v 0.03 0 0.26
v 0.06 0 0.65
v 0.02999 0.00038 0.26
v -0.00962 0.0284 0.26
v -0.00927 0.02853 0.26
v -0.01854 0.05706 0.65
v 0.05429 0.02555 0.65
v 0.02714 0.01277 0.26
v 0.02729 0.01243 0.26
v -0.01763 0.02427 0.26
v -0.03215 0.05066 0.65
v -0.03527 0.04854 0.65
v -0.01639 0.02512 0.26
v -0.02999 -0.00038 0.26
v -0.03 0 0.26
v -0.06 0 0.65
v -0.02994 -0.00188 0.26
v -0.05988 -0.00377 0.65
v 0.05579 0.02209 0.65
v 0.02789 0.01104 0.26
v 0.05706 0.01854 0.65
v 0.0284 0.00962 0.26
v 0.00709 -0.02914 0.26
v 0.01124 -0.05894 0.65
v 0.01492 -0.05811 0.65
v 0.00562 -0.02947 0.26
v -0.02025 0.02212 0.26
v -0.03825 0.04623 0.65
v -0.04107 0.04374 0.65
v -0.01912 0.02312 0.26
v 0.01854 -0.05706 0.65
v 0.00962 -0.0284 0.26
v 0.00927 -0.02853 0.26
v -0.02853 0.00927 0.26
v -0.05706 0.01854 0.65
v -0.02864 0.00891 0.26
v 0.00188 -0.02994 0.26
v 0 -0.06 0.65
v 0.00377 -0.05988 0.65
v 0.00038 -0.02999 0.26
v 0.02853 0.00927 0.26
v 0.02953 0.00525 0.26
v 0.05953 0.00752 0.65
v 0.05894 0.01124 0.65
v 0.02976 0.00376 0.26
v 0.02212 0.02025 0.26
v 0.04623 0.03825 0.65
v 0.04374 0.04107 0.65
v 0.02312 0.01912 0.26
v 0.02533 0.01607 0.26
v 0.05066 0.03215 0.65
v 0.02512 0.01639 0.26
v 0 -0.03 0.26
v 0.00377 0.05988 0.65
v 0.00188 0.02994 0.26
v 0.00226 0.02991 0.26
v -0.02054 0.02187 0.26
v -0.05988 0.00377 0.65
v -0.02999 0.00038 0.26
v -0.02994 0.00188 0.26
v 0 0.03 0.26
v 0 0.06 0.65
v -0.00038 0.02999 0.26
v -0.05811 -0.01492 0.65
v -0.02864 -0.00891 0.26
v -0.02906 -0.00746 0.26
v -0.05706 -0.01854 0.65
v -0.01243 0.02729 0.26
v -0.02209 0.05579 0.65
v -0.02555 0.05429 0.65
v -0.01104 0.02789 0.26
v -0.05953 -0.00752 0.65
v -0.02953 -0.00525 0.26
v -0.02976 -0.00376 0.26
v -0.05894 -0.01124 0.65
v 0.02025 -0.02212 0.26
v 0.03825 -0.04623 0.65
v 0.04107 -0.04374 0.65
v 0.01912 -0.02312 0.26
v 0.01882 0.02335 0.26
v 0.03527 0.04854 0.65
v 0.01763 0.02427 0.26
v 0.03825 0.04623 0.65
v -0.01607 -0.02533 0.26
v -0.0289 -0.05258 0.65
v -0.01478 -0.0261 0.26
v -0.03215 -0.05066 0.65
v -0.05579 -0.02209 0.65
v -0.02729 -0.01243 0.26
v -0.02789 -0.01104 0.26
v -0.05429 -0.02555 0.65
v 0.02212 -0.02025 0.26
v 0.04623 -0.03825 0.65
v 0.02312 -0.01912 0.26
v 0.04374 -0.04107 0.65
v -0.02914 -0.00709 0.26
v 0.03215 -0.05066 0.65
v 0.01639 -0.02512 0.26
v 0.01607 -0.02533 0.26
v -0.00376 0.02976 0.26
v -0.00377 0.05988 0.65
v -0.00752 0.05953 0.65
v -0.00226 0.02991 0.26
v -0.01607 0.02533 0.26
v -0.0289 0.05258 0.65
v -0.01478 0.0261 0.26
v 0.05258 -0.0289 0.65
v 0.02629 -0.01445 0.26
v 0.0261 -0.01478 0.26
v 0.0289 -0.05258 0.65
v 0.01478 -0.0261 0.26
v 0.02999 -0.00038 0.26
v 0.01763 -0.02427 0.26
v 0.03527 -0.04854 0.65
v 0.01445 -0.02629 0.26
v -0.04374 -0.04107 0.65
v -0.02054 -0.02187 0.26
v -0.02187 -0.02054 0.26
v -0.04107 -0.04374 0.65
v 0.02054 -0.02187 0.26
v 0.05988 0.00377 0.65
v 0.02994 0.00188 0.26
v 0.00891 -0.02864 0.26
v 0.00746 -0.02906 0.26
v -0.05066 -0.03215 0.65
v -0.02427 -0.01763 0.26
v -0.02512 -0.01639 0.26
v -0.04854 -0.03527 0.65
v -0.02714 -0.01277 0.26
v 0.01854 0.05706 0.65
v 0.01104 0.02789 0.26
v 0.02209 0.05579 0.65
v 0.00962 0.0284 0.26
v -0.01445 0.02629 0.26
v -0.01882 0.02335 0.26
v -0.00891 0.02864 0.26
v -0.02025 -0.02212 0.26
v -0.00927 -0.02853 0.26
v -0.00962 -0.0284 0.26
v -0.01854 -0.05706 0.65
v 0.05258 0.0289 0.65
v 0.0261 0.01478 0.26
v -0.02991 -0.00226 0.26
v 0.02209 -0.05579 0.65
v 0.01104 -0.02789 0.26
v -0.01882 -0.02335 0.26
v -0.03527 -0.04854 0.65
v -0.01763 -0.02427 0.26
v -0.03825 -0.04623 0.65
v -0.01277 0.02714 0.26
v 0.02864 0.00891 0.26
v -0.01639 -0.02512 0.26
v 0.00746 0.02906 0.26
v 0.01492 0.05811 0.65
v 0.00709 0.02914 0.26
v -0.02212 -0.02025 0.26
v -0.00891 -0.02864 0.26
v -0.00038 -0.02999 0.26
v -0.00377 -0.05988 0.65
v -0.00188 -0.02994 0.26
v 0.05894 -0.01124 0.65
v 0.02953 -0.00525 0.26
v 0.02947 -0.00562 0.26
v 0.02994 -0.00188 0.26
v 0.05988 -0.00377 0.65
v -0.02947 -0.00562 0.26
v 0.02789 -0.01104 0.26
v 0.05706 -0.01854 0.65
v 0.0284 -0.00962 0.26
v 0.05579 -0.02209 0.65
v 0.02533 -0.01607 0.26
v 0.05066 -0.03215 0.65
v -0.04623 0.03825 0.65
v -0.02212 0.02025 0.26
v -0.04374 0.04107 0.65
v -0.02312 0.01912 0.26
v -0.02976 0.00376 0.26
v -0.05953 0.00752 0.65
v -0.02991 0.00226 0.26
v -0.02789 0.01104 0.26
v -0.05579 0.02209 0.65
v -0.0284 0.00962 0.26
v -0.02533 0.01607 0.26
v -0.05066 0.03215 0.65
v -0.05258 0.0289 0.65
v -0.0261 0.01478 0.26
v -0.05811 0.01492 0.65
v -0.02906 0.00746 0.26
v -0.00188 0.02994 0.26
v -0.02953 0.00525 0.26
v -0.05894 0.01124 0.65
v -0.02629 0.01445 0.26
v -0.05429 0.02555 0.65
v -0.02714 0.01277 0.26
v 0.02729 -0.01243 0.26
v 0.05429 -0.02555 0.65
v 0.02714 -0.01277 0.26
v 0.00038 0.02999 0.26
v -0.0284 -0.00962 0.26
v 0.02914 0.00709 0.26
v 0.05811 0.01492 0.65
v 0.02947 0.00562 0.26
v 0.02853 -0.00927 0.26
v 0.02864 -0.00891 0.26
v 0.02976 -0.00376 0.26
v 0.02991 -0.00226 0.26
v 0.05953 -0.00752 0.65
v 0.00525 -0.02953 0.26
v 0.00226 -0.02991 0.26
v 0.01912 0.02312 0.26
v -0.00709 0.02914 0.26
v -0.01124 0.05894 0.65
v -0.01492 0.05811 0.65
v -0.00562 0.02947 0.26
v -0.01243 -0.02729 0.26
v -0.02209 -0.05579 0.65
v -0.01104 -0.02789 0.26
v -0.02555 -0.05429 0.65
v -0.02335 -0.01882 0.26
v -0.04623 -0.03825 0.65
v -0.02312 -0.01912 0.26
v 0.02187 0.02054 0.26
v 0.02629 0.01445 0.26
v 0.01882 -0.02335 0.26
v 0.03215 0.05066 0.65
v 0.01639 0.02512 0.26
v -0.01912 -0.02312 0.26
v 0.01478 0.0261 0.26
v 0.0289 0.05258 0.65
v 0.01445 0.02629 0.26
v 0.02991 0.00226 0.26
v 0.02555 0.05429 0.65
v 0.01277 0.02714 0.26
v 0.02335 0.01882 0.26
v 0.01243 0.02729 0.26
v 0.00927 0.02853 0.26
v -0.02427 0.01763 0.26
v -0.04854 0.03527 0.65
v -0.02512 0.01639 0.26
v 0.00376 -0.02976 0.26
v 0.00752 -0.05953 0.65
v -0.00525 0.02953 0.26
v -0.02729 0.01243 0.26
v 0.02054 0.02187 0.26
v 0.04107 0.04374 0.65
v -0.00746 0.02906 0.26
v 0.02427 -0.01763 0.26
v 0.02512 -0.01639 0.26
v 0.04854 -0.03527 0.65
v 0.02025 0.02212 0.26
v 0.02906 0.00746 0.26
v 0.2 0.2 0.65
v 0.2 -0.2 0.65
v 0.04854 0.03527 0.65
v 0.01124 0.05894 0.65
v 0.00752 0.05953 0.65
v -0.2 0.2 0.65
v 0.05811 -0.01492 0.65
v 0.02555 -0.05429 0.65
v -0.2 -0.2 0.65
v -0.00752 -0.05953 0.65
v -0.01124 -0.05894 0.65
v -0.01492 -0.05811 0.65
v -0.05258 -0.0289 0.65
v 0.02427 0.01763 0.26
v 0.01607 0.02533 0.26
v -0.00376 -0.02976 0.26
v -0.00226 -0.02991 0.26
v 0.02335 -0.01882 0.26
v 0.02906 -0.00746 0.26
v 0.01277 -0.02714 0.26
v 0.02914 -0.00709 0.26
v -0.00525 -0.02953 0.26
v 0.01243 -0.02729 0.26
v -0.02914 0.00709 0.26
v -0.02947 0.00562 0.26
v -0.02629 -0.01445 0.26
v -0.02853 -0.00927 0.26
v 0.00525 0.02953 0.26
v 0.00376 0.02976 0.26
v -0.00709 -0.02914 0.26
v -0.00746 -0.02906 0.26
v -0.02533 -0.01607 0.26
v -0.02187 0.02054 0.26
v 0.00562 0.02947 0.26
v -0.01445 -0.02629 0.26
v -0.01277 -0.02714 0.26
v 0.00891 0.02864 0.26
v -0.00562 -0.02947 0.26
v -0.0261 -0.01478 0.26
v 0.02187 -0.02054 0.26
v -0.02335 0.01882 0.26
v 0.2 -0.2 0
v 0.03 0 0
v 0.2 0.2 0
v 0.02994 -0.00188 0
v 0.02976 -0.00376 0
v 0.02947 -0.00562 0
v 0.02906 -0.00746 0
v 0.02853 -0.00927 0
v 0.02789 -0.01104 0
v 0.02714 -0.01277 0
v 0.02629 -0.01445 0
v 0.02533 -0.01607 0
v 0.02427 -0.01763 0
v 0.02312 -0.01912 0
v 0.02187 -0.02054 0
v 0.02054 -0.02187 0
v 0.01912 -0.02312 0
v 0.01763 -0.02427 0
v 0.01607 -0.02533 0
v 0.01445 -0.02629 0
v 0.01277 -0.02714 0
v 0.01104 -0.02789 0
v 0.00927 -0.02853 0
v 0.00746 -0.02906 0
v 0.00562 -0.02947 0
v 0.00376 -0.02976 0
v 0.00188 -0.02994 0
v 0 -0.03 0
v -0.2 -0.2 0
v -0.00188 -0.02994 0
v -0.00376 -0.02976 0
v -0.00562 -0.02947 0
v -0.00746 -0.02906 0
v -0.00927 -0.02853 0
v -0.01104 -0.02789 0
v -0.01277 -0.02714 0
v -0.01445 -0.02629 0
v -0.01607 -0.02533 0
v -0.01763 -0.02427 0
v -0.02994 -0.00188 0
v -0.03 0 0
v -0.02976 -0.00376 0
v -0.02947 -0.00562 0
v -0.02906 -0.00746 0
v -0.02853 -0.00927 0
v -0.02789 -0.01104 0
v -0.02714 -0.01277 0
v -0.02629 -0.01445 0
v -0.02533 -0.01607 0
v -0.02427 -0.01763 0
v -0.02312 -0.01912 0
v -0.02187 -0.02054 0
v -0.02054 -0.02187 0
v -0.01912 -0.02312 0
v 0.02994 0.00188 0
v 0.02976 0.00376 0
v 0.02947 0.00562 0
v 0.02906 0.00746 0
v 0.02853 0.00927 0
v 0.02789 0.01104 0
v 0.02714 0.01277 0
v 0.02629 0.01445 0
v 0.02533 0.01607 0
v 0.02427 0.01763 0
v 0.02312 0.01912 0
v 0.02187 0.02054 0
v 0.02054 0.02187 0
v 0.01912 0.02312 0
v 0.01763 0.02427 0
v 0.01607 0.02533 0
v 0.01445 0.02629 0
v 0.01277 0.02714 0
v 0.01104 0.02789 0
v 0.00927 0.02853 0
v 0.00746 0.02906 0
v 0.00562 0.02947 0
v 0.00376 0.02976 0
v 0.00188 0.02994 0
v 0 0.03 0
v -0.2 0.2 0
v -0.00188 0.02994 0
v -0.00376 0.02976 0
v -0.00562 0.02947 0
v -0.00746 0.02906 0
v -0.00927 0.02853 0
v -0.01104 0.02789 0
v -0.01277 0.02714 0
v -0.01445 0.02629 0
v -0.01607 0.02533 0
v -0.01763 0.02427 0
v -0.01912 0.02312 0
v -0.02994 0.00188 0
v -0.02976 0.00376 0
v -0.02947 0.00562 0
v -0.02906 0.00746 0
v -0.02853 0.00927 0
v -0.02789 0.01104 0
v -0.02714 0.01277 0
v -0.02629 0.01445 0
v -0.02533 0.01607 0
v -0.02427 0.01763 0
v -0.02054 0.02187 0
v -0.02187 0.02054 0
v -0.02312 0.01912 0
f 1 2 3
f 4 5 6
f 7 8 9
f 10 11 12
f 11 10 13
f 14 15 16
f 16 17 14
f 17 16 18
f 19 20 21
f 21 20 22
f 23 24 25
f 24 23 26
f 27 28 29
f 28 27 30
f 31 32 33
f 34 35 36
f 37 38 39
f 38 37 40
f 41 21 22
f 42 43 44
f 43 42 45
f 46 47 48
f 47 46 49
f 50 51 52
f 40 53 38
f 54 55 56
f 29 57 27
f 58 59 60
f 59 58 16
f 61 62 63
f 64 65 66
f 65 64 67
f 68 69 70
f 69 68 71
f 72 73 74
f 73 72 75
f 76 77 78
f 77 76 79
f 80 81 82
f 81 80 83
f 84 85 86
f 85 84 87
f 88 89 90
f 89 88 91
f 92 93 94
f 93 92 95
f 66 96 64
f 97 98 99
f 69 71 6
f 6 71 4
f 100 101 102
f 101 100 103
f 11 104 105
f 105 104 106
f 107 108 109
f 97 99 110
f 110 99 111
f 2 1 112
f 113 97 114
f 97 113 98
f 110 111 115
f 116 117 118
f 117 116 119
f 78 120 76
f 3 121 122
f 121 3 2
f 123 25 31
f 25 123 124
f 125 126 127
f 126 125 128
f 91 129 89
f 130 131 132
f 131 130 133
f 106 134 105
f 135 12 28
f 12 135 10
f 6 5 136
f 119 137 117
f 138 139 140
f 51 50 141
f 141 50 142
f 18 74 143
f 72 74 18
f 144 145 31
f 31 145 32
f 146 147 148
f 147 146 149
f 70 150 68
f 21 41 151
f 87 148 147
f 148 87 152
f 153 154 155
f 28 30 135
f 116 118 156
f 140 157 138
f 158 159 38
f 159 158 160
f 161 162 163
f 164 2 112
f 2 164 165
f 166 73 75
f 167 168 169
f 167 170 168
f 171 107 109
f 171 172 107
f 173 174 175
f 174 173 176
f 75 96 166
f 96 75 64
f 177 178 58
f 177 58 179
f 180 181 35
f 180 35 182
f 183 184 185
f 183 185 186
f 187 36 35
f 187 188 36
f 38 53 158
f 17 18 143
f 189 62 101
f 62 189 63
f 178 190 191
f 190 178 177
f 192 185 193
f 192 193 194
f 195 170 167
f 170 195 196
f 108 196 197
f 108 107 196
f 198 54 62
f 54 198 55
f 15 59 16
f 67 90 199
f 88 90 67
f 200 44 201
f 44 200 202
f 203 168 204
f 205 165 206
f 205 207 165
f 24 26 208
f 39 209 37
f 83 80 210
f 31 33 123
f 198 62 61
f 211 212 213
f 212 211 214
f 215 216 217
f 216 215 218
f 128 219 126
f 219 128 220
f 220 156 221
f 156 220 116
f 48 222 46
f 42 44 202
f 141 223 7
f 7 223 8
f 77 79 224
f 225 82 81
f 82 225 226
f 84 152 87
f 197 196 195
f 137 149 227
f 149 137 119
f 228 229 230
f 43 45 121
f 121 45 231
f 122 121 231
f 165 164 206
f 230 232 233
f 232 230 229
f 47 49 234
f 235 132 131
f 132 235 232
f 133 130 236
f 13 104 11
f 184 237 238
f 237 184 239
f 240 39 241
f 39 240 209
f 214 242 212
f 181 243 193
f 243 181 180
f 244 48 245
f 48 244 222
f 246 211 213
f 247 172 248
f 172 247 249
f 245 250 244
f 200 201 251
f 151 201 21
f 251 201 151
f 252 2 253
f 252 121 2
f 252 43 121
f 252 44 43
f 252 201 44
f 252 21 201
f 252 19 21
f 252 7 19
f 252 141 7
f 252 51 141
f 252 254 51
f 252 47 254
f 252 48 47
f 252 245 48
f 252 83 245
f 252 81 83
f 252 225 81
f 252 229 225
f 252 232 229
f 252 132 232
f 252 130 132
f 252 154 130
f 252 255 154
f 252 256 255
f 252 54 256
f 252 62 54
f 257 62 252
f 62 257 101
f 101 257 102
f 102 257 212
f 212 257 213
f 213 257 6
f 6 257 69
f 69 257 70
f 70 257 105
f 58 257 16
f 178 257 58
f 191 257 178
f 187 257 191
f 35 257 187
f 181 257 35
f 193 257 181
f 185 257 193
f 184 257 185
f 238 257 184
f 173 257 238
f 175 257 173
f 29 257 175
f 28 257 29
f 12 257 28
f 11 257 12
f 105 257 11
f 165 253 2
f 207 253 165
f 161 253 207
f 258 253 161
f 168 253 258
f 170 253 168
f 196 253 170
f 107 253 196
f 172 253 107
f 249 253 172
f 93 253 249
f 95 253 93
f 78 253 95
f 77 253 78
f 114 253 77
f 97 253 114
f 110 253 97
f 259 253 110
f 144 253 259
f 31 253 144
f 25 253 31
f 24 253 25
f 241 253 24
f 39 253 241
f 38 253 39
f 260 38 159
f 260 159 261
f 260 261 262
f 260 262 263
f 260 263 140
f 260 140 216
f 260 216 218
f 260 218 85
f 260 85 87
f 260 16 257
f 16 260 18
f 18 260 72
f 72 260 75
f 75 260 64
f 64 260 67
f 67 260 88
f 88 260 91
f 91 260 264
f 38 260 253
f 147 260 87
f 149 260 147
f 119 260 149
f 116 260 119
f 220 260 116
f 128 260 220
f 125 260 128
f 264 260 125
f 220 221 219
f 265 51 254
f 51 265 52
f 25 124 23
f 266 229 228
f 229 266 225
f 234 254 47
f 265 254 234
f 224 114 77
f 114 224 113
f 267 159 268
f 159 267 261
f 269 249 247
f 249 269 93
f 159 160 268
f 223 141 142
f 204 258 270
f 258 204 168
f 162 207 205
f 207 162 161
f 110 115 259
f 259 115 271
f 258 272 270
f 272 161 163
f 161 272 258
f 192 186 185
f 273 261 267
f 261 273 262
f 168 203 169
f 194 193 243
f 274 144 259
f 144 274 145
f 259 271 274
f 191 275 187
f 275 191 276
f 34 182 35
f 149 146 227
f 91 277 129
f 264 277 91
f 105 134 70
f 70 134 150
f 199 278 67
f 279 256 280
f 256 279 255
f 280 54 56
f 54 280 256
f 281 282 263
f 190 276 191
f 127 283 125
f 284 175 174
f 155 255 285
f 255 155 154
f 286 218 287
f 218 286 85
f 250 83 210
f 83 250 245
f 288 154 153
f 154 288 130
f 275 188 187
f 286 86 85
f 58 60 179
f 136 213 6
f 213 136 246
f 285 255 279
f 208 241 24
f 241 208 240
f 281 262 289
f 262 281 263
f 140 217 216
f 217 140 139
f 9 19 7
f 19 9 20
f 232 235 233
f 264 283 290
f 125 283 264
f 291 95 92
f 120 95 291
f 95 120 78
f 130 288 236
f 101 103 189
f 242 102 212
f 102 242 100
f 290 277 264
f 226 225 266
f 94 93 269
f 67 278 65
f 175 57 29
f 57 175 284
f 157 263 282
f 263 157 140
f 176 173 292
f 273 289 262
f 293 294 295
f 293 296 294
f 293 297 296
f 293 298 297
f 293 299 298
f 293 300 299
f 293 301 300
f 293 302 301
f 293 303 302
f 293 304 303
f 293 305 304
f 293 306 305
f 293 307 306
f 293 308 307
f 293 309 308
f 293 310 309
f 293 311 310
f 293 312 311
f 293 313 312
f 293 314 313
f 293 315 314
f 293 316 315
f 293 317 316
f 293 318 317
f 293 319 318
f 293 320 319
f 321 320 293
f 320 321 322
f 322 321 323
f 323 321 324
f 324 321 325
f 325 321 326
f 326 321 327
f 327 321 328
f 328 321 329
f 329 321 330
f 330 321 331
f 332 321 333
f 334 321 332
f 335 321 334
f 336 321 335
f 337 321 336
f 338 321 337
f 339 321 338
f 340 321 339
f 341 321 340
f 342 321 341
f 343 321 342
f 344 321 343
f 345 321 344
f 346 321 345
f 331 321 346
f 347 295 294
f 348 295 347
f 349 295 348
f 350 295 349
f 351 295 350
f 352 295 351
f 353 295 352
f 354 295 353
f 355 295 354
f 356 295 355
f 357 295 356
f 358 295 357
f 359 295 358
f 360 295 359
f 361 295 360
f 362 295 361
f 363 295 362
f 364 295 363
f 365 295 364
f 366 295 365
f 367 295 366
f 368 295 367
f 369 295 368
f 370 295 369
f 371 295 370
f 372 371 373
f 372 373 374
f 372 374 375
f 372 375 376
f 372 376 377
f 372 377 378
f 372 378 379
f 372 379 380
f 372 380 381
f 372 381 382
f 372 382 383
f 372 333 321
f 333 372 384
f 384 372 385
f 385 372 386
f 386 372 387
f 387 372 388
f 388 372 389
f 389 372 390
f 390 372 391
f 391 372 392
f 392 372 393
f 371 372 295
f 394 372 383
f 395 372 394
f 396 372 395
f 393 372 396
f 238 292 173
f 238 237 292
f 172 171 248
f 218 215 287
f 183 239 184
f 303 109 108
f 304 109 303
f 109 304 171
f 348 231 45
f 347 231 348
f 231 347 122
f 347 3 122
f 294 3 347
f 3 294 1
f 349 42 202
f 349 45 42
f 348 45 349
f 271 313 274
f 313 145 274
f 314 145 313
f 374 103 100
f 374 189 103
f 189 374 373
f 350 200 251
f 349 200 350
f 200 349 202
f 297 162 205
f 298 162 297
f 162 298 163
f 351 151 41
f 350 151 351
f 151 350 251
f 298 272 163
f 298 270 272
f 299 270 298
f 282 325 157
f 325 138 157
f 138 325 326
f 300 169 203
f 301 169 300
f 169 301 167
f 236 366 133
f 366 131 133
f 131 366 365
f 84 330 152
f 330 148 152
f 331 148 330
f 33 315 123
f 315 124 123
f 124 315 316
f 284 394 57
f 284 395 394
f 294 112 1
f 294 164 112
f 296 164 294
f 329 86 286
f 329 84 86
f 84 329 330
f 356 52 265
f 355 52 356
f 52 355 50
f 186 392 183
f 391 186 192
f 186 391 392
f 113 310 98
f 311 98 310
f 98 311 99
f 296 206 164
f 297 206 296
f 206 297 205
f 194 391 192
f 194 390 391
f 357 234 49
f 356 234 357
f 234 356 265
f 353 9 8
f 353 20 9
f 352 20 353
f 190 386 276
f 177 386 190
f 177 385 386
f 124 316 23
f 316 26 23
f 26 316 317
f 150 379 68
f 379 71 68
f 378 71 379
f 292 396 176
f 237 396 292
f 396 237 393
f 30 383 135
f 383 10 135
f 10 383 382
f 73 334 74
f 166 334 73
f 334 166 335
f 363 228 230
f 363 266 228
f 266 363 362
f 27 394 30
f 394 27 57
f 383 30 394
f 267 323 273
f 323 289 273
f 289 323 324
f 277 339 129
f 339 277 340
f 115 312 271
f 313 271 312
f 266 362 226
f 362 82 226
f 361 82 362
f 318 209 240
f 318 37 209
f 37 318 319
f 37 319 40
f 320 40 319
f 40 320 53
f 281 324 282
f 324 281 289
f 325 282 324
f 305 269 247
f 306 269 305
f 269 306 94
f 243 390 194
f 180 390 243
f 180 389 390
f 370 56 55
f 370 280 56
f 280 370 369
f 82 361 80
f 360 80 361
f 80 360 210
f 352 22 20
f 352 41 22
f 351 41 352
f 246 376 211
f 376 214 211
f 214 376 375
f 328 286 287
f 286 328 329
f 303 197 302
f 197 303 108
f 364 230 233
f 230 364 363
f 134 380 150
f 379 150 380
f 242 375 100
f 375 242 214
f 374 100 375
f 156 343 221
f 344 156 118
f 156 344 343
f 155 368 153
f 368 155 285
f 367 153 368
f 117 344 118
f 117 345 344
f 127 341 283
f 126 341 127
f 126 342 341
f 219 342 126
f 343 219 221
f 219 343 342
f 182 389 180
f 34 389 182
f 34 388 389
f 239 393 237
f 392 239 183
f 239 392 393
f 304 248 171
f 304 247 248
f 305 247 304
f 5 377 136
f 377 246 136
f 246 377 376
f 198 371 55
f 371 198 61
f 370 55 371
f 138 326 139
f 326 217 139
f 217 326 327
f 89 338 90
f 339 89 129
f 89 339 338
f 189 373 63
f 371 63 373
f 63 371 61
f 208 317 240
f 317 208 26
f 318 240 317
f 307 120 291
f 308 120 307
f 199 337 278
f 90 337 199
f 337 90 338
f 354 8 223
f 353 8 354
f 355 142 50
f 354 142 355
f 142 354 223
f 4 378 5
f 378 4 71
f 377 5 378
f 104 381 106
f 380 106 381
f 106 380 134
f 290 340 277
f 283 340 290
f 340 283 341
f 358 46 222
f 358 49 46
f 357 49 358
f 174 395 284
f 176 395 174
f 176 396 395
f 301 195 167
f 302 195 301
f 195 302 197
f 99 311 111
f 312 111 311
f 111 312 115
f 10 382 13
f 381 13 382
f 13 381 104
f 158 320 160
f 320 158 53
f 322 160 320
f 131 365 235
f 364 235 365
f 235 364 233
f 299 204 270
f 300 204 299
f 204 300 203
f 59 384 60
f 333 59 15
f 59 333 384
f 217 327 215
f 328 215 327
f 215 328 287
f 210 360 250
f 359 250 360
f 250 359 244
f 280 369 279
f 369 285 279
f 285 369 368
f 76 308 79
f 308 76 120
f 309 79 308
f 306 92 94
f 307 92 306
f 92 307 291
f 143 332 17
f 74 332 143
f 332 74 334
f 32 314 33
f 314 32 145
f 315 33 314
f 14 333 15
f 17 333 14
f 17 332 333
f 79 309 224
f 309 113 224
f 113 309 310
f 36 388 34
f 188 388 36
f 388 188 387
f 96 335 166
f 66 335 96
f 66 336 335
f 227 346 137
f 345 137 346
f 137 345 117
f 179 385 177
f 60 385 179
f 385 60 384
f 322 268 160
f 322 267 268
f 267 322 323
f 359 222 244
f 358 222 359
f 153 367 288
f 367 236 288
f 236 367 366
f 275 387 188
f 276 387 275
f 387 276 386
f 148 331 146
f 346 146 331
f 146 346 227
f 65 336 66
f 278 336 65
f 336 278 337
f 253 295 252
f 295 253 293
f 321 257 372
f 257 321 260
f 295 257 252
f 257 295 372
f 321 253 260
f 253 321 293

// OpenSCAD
union() {
  difference() {
    scale([0.4,0.4,0.65]) {
      translate([0,0,0.5]) {
        cube(center=true);
      }
    }
    union() {
      cylinder(h=0.65, r1=0.01, r2=0.06, $fn=100);
      cylinder(h=0.65, r=0.03, $fn=100);
    }
  }
}
